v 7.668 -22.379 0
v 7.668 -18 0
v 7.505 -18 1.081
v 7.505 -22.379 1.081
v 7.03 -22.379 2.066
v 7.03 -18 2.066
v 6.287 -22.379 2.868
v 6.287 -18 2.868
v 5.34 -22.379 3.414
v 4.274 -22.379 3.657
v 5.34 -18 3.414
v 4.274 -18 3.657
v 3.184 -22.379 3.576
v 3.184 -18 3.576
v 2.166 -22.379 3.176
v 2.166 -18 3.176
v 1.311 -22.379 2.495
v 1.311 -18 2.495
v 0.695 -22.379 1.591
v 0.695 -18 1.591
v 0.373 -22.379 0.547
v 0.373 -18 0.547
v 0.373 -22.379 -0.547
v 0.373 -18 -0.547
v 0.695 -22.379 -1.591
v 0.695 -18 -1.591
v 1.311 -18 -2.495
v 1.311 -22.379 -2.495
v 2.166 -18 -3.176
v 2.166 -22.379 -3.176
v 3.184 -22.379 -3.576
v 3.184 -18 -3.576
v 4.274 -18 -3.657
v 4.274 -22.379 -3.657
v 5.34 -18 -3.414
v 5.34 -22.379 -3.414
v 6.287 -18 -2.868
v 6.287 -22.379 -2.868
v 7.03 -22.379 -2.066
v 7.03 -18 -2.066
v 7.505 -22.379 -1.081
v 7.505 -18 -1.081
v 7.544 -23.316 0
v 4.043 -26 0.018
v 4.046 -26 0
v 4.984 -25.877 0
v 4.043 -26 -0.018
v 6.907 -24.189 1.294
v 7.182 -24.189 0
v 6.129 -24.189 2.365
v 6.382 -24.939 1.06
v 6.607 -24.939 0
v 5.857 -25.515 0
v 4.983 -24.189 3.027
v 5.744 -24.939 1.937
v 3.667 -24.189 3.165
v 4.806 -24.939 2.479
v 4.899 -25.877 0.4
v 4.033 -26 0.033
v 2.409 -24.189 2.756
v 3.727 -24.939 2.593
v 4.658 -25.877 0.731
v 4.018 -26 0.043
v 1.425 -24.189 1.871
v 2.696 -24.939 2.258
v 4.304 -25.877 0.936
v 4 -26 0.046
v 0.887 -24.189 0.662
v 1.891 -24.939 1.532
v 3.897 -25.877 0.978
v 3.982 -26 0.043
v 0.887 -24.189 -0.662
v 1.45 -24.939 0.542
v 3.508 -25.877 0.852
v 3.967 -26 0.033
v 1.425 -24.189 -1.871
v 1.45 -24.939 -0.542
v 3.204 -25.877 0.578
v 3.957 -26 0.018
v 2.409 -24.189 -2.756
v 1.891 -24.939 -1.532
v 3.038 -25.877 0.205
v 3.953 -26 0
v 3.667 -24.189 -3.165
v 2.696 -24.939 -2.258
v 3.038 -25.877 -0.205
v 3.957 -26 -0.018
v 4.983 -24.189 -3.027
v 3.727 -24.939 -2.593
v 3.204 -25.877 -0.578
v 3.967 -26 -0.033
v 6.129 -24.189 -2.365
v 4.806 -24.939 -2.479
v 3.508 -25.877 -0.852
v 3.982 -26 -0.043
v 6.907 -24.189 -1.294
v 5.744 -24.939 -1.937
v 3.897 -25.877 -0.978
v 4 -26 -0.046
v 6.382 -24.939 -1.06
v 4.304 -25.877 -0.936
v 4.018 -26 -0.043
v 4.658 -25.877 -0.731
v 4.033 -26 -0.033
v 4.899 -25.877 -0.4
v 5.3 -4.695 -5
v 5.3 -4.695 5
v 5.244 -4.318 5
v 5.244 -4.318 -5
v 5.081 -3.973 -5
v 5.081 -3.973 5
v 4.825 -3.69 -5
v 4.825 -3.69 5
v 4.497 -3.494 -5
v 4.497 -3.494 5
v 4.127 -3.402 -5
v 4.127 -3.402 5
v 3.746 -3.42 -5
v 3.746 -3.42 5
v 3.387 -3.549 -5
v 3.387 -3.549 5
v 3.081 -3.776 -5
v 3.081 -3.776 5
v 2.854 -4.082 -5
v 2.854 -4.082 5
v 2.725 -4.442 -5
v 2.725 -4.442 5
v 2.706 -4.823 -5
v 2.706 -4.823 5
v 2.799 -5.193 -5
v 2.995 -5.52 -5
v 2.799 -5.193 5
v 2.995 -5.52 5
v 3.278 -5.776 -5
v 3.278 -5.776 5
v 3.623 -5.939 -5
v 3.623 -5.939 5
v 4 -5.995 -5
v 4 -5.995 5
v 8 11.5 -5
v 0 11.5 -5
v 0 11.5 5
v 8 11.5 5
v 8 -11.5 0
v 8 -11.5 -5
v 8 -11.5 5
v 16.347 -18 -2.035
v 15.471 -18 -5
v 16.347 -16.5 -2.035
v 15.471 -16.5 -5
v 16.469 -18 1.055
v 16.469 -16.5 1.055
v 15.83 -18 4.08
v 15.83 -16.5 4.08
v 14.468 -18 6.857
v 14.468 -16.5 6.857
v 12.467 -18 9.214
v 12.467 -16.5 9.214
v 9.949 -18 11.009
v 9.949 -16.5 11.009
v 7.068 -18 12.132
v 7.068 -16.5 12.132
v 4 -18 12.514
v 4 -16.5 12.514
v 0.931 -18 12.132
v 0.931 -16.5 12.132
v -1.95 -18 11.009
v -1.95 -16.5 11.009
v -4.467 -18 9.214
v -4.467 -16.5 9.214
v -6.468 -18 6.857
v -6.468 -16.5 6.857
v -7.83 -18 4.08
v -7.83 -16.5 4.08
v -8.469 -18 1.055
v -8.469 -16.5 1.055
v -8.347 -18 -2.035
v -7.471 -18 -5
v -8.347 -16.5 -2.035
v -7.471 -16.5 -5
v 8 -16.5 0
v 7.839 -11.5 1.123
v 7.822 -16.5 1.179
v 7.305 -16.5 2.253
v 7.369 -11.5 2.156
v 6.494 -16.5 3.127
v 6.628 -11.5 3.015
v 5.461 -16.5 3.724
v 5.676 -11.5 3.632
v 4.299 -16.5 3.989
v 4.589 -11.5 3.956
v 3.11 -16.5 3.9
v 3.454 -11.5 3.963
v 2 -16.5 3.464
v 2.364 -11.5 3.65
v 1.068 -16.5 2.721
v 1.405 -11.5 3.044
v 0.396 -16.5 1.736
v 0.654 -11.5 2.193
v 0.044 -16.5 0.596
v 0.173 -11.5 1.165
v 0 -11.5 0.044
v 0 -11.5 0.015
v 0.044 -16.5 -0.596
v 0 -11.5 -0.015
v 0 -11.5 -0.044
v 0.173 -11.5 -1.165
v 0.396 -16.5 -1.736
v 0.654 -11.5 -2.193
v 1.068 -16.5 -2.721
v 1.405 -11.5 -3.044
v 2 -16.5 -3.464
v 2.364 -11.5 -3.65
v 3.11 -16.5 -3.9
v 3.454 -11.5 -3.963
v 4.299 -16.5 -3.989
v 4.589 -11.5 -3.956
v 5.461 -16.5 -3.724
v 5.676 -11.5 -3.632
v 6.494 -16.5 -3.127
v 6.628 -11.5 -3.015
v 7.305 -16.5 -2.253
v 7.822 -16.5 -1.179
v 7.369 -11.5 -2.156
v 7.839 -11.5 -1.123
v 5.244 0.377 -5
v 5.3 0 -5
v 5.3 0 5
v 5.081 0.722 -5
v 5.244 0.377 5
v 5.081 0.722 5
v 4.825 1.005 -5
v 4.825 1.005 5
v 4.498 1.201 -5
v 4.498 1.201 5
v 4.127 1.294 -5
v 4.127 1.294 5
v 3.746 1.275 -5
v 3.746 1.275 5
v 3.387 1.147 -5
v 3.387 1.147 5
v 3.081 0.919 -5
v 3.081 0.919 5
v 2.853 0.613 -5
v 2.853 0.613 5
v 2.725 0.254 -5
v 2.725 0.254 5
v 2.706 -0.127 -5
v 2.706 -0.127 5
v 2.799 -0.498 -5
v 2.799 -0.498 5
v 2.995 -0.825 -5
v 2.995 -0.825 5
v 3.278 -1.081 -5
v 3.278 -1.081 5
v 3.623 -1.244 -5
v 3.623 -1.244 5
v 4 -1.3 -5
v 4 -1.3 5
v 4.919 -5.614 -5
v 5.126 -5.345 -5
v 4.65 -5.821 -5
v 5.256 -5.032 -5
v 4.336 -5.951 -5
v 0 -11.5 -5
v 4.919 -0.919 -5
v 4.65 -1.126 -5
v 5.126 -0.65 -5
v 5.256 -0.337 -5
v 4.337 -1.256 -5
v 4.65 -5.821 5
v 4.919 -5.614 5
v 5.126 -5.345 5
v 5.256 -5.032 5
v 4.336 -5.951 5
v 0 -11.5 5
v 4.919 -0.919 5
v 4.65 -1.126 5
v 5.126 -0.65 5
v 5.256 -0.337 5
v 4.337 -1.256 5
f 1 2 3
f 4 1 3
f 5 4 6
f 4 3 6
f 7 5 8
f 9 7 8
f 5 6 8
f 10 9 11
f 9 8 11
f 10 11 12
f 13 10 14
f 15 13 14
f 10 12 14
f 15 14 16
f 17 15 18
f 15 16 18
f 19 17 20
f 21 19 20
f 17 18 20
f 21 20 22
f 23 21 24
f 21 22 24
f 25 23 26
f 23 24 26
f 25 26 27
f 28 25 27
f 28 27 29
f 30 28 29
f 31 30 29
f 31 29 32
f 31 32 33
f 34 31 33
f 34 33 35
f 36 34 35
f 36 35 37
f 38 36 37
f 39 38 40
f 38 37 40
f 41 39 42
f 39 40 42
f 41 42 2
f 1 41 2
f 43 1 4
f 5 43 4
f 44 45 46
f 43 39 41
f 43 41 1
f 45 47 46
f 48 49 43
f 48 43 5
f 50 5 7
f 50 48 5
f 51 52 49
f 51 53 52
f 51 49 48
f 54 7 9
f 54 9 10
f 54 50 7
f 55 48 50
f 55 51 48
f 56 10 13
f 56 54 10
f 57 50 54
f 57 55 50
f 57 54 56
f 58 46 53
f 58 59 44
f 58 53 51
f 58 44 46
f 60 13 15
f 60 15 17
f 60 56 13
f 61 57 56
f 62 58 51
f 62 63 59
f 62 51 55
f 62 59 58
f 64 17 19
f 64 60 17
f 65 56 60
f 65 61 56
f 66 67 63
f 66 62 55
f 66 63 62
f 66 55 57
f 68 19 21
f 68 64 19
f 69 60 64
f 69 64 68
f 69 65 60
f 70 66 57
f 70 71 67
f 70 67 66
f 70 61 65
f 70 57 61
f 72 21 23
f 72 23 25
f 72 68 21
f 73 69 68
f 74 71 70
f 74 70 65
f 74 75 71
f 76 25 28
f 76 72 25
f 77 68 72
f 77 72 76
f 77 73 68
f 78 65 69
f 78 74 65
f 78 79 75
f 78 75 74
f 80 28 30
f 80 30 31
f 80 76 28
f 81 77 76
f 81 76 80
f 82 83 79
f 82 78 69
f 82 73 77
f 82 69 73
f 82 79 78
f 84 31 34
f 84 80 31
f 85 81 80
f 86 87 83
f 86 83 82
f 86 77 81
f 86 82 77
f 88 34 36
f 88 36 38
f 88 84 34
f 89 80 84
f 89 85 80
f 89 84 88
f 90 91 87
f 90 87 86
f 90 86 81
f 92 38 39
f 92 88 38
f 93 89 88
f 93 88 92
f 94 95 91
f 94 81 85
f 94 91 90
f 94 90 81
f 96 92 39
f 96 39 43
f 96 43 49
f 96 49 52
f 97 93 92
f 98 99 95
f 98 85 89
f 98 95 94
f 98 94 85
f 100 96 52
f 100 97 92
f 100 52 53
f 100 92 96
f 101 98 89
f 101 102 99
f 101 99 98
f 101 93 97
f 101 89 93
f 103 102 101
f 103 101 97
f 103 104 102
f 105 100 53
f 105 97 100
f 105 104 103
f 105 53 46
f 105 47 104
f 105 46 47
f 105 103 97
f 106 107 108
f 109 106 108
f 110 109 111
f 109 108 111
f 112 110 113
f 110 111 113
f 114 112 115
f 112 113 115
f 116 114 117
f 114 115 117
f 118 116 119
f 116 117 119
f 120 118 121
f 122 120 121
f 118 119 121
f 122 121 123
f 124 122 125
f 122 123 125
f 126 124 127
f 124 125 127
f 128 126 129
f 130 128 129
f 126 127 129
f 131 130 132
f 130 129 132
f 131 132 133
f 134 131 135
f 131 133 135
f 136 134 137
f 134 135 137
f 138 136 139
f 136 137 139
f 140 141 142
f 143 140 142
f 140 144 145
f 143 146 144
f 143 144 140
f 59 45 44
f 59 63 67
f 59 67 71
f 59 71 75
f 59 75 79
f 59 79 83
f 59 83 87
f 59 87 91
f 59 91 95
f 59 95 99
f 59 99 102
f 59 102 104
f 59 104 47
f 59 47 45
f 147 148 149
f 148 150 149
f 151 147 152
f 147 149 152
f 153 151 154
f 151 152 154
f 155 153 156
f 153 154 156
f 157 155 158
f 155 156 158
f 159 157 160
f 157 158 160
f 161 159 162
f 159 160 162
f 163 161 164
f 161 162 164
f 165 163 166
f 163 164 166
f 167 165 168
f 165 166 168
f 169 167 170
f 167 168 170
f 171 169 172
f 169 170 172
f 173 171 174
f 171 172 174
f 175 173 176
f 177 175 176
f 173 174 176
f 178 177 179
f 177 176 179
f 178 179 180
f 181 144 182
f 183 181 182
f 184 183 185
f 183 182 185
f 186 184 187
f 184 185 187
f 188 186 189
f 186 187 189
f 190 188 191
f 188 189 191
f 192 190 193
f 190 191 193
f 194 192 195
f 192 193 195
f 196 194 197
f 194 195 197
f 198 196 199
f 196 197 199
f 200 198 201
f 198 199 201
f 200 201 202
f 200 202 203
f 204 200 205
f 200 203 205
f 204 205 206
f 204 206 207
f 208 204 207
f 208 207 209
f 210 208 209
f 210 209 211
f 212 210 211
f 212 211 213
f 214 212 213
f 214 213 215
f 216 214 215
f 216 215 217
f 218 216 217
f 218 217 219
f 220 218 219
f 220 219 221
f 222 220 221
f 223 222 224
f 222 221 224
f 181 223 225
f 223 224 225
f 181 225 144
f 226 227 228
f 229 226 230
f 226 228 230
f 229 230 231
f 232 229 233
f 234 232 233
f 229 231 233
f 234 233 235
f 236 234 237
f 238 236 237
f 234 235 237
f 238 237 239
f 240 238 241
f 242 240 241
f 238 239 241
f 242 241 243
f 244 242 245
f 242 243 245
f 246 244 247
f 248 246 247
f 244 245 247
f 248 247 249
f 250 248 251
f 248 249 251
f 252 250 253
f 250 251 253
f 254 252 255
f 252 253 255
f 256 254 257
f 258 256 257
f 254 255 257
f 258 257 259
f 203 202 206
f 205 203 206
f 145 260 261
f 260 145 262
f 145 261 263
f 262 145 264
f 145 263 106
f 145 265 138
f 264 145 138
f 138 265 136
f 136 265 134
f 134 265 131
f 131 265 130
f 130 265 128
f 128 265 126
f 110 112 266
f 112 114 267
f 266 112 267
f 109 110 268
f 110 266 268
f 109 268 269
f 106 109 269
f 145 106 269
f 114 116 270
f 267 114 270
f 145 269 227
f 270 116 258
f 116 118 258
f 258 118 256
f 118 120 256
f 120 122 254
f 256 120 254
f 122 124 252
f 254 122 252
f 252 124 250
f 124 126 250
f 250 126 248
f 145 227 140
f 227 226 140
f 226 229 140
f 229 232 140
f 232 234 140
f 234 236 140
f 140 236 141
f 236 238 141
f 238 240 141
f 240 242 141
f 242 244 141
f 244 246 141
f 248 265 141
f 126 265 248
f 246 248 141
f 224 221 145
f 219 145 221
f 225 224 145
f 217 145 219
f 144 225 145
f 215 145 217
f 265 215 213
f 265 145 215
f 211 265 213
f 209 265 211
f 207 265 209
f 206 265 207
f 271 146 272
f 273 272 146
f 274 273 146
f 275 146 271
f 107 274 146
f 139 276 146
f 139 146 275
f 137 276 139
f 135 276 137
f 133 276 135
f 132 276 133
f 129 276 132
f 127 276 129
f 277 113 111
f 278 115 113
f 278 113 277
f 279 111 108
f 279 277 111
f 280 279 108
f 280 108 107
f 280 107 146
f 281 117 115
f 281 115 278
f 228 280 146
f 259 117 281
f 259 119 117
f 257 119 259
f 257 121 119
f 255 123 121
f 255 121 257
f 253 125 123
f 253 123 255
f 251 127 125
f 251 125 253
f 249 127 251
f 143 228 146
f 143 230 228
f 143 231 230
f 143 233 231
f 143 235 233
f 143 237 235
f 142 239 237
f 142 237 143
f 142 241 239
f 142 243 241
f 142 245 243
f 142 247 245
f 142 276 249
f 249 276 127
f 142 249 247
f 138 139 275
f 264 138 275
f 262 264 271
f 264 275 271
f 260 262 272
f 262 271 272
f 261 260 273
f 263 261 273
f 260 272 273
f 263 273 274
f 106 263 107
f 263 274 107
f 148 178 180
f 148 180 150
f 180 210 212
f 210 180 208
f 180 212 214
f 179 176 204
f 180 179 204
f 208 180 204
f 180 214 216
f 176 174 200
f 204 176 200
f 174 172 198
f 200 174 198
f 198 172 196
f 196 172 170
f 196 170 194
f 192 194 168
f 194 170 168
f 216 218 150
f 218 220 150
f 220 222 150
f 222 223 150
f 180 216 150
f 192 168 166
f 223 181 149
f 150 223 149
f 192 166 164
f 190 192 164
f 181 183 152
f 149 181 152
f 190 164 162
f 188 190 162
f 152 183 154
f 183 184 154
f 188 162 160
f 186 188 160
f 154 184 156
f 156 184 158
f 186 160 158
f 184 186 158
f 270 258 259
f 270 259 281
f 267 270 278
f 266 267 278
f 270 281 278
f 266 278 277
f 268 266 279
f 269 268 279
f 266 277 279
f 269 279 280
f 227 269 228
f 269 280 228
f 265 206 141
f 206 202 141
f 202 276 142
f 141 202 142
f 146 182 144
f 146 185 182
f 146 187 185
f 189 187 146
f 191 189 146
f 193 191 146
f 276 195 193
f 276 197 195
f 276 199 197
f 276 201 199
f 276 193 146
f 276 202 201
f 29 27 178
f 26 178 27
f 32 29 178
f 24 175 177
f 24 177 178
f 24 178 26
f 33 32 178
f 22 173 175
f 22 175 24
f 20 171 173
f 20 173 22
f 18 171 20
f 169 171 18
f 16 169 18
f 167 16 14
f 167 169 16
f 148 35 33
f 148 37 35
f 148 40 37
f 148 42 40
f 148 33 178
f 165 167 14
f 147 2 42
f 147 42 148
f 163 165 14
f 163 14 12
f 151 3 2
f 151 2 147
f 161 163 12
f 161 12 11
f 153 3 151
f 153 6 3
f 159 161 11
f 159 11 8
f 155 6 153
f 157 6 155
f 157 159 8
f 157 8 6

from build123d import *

# Parameters (mm, degrees)
F0_W      = 23
F0_H      = 10
F1_DEPTH  = 8
F2_R      = 4.000122
F3_DEPTH  = 5
F4_R      = 12.513681
F5_DEPTH  = 1.5
F6_R      = 3.667742
F7_DEPTH  = 8
F8_R      = 3.62132
F10_DEPTH = 25
F13_DEPTH = 25
F14_W     = 28.555372
F14_H     = 6.345639
F15_DEPTH = 9.5


with BuildPart() as f1:
    # F0 (on Right) → F1 (new body)
    with BuildSketch(Plane.YZ):
        Rectangle(F0_W, F0_H)
    extrude(amount=F1_DEPTH)

    # F2 (on face) → F3 (join)
    with BuildSketch(Plane.XZ.offset(11.5)):
        with Locations((3.999878, 0)):
            Circle(F2_R)
    extrude(amount=F3_DEPTH)

    # F4 (on face) → F5 (join)
    with BuildSketch(Plane.XZ.offset(16.5)):
        with Locations((3.999878, 0)):
            Circle(F4_R)
    extrude(amount=F5_DEPTH)

    # F6 (on face) → F7 (join)
    with BuildSketch(Plane.XZ.offset(18)):
        with Locations((3.999878, 0)):
            Circle(F6_R)
    extrude(amount=F7_DEPTH)

    # F8
    f8_edges = [f1.edges().sort_by_distance(p)[0] for p in [
        (0.332136, -26, 0),
    ]]
    fillet(f8_edges, radius=F8_R)

    # F9 (on face) → F10 (cut)
    with BuildSketch(Plane.XY.offset(5)):
        with BuildLine():
            ThreePointArc((4, -1.300277), (4.919435, -0.919435), (5.300277, 0))
            ThreePointArc((5.300277, 0), (3.080565, 0.919435), (4, -1.300277))
        make_face()
    extrude(amount=-F10_DEPTH, mode=Mode.SUBTRACT)

    # F11 (on face) → F13 (cut)
    with BuildSketch(Plane.XY.offset(5)):
        with BuildLine():
            ThreePointArc((4, -5.995241), (4.919239, -5.61448), (5.3, -4.695241))
            ThreePointArc((5.3, -4.695241), (3.080761, -3.776003), (4, -5.995241))
        make_face()
    extrude(amount=-F13_DEPTH, mode=Mode.SUBTRACT)

    # F14 (on face) → F15 (cut)
    with BuildSketch(Plane(origin=(0, 0, -5), x_dir=(1, 0, 0), z_dir=(0, 0, -1))):
        with Locations((3.811784, 17.208513)):
            Rectangle(F14_W, F14_H)
    extrude(amount=F15_DEPTH, mode=Mode.SUBTRACT)


solid = f1.part
